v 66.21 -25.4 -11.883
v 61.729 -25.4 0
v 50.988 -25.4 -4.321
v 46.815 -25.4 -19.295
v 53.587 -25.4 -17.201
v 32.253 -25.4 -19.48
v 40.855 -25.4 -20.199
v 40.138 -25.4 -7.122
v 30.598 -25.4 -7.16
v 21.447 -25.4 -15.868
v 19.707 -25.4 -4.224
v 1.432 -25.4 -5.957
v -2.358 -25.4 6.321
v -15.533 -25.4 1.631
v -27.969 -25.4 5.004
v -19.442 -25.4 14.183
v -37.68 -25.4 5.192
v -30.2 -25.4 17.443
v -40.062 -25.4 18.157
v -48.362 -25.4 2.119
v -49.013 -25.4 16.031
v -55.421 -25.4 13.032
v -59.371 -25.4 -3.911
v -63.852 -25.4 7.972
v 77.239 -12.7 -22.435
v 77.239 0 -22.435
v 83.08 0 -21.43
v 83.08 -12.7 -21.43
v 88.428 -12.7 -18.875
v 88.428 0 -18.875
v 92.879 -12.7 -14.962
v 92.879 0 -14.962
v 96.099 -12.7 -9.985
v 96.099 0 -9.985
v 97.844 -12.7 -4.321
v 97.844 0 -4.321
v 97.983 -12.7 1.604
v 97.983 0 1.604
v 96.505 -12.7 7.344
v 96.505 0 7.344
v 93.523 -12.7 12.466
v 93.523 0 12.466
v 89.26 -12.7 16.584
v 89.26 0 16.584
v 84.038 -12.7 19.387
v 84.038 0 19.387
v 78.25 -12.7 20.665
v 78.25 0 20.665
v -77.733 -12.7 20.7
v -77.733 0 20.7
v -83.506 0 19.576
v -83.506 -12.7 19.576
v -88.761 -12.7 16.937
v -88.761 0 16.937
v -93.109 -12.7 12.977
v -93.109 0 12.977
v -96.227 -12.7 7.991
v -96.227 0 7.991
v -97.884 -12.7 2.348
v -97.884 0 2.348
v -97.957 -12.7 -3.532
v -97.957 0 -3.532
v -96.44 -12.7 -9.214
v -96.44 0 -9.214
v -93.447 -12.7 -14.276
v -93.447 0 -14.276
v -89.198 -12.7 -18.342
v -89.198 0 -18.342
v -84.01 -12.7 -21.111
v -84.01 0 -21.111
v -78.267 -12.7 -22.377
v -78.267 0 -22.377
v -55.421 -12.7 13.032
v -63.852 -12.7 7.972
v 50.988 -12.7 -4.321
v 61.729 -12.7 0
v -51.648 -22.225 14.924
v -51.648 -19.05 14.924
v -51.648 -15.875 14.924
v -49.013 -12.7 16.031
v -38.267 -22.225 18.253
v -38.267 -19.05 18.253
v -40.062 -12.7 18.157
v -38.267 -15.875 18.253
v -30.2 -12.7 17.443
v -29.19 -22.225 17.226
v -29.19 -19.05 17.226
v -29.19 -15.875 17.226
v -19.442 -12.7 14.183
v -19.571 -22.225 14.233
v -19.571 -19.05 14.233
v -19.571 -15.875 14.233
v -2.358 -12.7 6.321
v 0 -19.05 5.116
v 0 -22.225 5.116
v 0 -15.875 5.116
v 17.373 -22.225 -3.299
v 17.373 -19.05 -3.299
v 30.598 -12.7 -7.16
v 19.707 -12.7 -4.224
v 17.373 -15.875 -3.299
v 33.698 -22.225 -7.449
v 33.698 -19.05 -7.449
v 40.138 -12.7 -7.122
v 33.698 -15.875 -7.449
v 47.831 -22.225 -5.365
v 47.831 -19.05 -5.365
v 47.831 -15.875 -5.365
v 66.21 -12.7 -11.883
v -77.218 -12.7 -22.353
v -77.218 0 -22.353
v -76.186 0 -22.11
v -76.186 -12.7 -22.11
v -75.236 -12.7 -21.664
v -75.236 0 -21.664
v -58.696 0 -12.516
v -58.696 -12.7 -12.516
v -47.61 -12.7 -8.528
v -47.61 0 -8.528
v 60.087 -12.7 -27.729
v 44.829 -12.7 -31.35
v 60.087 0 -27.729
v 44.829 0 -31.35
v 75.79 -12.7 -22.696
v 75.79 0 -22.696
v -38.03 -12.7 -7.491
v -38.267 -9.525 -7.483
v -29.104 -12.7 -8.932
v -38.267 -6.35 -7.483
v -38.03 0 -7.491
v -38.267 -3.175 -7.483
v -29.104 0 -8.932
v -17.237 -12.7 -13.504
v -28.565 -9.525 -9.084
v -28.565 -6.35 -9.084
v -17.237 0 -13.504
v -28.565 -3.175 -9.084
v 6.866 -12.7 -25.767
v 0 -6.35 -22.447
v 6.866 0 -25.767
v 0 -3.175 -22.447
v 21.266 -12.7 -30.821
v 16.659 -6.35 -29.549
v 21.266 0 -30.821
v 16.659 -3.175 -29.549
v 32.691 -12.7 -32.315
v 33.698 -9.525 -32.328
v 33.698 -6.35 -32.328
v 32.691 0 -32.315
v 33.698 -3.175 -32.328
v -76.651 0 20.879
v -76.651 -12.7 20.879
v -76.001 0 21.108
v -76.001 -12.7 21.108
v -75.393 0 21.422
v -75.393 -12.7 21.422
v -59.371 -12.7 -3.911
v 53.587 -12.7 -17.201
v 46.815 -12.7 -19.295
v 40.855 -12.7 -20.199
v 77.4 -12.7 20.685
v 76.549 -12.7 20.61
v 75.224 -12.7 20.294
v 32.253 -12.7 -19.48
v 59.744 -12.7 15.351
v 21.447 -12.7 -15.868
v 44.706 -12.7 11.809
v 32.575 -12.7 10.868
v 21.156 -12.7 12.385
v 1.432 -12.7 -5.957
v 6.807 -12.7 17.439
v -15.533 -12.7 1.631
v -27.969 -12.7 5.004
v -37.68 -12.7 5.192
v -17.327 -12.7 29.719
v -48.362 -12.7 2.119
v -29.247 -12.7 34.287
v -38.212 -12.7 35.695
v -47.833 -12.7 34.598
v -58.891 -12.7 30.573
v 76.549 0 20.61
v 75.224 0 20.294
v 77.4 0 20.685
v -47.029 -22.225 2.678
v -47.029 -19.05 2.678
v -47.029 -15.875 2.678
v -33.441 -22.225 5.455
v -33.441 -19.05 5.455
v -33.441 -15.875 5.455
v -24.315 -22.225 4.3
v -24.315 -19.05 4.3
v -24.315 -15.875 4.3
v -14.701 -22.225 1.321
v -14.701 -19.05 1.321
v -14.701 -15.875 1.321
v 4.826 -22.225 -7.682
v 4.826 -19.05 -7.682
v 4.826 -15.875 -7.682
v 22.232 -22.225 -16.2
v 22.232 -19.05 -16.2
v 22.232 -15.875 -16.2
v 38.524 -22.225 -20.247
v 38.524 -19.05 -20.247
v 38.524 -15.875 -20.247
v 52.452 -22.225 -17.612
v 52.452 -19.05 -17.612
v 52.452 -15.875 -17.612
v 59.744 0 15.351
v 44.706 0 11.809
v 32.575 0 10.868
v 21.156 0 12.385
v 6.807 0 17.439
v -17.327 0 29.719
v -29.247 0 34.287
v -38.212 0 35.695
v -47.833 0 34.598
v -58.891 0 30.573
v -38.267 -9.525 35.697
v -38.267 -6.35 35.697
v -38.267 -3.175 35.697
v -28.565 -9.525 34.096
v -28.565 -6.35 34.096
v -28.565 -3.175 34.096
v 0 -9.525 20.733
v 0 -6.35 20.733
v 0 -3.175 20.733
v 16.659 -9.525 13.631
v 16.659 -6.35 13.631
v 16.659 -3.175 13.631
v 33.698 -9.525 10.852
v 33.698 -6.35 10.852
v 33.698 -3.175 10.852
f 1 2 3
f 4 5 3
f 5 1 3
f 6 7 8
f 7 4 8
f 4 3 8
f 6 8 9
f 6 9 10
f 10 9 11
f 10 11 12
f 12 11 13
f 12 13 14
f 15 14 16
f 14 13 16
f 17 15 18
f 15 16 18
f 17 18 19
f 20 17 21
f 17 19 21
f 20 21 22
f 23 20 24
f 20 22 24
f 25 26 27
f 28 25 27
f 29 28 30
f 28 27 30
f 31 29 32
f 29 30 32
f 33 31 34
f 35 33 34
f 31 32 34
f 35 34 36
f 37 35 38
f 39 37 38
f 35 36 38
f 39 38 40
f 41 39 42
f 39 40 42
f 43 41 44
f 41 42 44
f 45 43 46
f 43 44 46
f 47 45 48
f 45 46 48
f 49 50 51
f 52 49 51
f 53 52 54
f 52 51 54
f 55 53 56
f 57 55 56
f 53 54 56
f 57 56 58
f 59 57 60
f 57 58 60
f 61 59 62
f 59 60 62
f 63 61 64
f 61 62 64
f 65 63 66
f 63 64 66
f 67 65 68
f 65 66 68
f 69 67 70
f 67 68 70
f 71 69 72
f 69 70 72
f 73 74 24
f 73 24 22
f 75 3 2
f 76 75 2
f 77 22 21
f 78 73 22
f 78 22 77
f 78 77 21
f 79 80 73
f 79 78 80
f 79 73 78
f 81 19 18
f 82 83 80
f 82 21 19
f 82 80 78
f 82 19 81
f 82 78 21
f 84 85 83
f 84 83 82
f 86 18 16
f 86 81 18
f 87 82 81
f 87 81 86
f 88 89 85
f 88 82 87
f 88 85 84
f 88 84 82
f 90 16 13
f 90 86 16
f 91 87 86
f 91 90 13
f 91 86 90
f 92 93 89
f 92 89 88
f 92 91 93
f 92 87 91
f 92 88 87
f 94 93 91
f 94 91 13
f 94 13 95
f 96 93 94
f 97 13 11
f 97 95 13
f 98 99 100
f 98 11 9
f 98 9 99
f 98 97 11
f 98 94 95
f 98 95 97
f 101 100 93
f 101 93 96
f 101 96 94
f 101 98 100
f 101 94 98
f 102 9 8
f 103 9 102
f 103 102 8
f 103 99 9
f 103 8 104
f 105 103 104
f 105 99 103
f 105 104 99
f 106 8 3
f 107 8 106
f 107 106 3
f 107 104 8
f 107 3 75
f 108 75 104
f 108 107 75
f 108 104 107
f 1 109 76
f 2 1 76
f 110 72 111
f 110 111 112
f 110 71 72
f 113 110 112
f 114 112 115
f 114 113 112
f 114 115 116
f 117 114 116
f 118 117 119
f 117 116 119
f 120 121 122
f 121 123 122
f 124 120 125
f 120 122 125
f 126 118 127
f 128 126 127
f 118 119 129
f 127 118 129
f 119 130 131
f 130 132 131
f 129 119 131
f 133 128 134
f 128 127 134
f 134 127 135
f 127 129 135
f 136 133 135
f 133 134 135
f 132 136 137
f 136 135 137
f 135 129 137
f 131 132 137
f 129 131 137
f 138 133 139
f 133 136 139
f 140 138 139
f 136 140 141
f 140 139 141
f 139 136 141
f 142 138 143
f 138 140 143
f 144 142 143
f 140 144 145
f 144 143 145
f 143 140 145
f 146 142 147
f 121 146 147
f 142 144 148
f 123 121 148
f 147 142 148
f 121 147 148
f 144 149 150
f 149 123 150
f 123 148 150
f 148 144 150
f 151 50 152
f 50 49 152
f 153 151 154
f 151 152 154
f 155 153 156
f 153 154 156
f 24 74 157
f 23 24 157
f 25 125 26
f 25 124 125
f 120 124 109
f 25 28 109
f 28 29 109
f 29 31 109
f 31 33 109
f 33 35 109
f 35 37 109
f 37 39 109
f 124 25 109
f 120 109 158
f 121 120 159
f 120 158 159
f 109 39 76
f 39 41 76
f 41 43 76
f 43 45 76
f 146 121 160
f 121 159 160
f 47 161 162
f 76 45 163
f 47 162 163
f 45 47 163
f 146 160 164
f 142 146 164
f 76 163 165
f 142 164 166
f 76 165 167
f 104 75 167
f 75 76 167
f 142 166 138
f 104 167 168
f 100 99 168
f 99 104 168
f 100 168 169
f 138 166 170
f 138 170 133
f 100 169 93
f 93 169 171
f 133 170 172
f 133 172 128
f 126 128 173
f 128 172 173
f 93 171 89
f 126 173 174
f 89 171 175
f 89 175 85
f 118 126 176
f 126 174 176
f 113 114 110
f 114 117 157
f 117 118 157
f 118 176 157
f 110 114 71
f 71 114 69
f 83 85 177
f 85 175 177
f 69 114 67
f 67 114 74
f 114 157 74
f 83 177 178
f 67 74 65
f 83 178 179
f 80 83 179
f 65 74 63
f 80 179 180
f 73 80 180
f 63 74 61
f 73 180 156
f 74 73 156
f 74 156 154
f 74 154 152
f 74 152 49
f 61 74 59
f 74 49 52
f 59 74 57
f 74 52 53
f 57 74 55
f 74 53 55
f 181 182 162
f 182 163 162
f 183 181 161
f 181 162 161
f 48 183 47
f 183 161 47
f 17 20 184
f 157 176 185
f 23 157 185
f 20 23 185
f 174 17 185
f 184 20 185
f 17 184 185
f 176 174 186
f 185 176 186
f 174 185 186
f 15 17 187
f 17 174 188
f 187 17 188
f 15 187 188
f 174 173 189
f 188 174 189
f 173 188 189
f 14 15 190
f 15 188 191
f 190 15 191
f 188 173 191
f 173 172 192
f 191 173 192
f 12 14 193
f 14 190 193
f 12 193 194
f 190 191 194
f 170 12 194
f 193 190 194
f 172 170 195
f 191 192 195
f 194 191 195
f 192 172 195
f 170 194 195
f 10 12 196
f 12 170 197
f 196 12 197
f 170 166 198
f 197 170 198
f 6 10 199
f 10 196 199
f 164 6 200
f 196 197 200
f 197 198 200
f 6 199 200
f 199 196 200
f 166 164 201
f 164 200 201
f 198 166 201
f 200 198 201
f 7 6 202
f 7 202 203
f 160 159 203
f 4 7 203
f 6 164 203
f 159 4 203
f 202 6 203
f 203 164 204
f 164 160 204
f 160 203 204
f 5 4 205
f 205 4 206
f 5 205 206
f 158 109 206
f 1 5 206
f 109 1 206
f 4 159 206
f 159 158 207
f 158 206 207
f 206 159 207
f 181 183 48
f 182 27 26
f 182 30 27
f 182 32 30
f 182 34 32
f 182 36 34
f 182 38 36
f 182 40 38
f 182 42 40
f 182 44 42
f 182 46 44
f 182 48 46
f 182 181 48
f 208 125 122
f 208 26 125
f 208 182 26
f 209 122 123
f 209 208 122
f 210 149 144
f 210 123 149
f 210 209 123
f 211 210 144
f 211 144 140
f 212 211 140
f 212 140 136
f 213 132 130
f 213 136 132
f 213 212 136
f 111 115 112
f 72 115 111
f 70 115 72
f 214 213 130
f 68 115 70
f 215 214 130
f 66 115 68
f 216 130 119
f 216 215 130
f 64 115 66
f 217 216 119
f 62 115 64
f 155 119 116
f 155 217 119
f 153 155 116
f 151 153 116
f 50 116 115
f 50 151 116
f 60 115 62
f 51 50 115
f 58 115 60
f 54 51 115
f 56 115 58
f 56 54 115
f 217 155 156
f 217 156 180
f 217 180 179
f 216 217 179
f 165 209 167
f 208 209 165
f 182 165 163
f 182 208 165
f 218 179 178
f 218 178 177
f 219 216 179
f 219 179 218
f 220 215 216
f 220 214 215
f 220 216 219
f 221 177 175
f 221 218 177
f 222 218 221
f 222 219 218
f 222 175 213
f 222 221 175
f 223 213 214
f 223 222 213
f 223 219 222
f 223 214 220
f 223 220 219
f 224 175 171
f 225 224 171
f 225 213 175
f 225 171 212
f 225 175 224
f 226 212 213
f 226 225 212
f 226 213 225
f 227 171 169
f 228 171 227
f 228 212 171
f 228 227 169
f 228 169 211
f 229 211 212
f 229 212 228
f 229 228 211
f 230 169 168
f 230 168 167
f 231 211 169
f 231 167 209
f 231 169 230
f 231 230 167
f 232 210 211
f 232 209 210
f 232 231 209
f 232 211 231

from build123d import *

# Parameters (mm, degrees)
F1_DEPTH = 12.7
F2_DEPTH = 25.4
F3_R     = 7.62
F4_R     = 5.08
F5_R     = 5.08
F6_R     = 5.08


# Not quite as in the source:
# - the program builds the solid bodies; features that only make, move or delete a surface that nothing else refers to are left out


with BuildPart() as f1:
    # F0 (on Front) → F1 (new body)
    with BuildSketch(Plane.XZ):
        with BuildLine():
            add(Edge.make_bspline(
                [(-76.5334740281, 20.7332828829), (-63.8515293548, 28.3869740492), (-38.487641079, 43.6943557355), (-0.1074870643, 19.2987869132), (33.6920782855, 6.372177087), (61.7287419774, 15.7705051868), (76.5334740281, 20.7332828829)],
                knots=[0, 0, 0, 0, 0.252598913, 0.5051978047, 0.7387201987, 1, 1, 1, 1], degree=3))
            Line((-76.5334740281, 20.7332828829), (-76.5334740281, -22.4467171171))
            add(Edge.make_bspline(
                [(-76.5334740281, -22.4467171171), (-63.8515293548, -14.7930259508), (-38.487641079, 0.5143557355), (-0.1074870643, -23.8812130868), (33.6920782855, -36.807822913), (61.7287419774, -27.4094948132), (76.5334740281, -22.4467171171)],
                knots=[0, 0, 0, 0, 0.252598913, 0.5051978047, 0.7387201987, 1, 1, 1, 1], degree=3))
            Line((76.5334740281, -22.4467171171), (76.5334740281, 20.7332828829))
        make_face()
        with BuildLine():
            Line((-59.3705394858, -3.9110629208), (-63.8515293548, 7.9721491784))
            add(Edge.make_bspline(
                [(-63.8515293548, 7.9721491784), (-55.8466582979, 13.0095149676), (-38.1452218943, 24.1488087208), (0.3419863459, 5.213337181), (32.9615149645, -12.272359942), (52.4893434663, -3.9416111996), (61.7287419774, 0)],
                knots=[0, 0, 0, 0, 0.228361581, 0.5049835251, 0.7657878611, 1, 1, 1, 1], degree=3))
            Line((61.7287419774, 0), (66.2097318464, -11.8832120992))
            add(Edge.make_bspline(
                [(-59.3705394858, -3.9110629208), (-51.3634228426, 1.1277159879), (-33.1115500983, 10.7952182475), (5.0660805533, -7.2965458084), (37.9471343056, -25.5812525078), (56.9802173789, -15.8206066761), (66.2097318464, -11.8832120992)],
                knots=[0, 0, 0, 0, 0.2284256427, 0.505143577, 0.7660384145, 1, 1, 1, 1], degree=3))
        make_face(mode=Mode.SUBTRACT)
        with BuildLine():
            Line((-76.5334740281, -22.4467171171), (-76.5334740281, 20.7332828829))
            ThreePointArc((-76.5334740281, 20.7332828829), (-98.1234740281, -0.8567171171), (-76.5334740281, -22.4467171171))
        make_face()
        with BuildLine():
            ThreePointArc((76.5334740281, -22.4467171171), (98.1234740281, -0.8567171171), (76.5334740281, 20.7332828829))
            Line((76.5334740281, 20.7332828829), (76.5334740281, -22.4467171171))
        make_face()
    extrude(amount=F1_DEPTH)

    # F0 (on Front) → F2 (join)
    with BuildSketch(Plane.XZ):
        with BuildLine():
            add(Edge.make_bspline(
                [(-63.8515293548, 7.9721491784), (-55.8466582979, 13.0095149676), (-38.1452218943, 24.1488087208), (0.3419863459, 5.213337181), (32.9615149645, -12.272359942), (52.4893434663, -3.9416111996), (61.7287419774, 0)],
                knots=[0, 0, 0, 0, 0.228361581, 0.5049835251, 0.7657878611, 1, 1, 1, 1], degree=3))
            Line((-63.8515293548, 7.9721491784), (-59.3705394858, -3.9110629208))
            add(Edge.make_bspline(
                [(-59.3705394858, -3.9110629208), (-51.3634228426, 1.1277159879), (-33.1115500983, 10.7952182475), (5.0660805533, -7.2965458084), (37.9471343056, -25.5812525078), (56.9802173789, -15.8206066761), (66.2097318464, -11.8832120992)],
                knots=[0, 0, 0, 0, 0.2284256427, 0.505143577, 0.7660384145, 1, 1, 1, 1], degree=3))
            Line((66.2097318464, -11.8832120992), (61.7287419774, 0))
        make_face()
    extrude(amount=F2_DEPTH)

    # F3
    f3_edges = [f1.edges().sort_by_distance(p)[0] for p in [
        (76.533474, -6.35, 20.733283),
    ]]
    fillet(f3_edges, radius=F3_R)

    # F4
    f4_edges = [f1.edges().sort_by_distance(p)[0] for p in [
        (-76.533474, -6.35, -22.446717),
    ]]
    fillet(f4_edges, radius=F4_R)

    # F5
    f5_edges = [f1.edges().sort_by_distance(p)[0] for p in [
        (-76.533474, -6.35, 20.733283),
    ]]
    fillet(f5_edges, radius=F5_R)

    # F6
    f6_edges = [f1.edges().sort_by_distance(p)[0] for p in [
        (76.533474, -6.35, -22.446717),
    ]]
    fillet(f6_edges, radius=F6_R)


solid = f1.part
